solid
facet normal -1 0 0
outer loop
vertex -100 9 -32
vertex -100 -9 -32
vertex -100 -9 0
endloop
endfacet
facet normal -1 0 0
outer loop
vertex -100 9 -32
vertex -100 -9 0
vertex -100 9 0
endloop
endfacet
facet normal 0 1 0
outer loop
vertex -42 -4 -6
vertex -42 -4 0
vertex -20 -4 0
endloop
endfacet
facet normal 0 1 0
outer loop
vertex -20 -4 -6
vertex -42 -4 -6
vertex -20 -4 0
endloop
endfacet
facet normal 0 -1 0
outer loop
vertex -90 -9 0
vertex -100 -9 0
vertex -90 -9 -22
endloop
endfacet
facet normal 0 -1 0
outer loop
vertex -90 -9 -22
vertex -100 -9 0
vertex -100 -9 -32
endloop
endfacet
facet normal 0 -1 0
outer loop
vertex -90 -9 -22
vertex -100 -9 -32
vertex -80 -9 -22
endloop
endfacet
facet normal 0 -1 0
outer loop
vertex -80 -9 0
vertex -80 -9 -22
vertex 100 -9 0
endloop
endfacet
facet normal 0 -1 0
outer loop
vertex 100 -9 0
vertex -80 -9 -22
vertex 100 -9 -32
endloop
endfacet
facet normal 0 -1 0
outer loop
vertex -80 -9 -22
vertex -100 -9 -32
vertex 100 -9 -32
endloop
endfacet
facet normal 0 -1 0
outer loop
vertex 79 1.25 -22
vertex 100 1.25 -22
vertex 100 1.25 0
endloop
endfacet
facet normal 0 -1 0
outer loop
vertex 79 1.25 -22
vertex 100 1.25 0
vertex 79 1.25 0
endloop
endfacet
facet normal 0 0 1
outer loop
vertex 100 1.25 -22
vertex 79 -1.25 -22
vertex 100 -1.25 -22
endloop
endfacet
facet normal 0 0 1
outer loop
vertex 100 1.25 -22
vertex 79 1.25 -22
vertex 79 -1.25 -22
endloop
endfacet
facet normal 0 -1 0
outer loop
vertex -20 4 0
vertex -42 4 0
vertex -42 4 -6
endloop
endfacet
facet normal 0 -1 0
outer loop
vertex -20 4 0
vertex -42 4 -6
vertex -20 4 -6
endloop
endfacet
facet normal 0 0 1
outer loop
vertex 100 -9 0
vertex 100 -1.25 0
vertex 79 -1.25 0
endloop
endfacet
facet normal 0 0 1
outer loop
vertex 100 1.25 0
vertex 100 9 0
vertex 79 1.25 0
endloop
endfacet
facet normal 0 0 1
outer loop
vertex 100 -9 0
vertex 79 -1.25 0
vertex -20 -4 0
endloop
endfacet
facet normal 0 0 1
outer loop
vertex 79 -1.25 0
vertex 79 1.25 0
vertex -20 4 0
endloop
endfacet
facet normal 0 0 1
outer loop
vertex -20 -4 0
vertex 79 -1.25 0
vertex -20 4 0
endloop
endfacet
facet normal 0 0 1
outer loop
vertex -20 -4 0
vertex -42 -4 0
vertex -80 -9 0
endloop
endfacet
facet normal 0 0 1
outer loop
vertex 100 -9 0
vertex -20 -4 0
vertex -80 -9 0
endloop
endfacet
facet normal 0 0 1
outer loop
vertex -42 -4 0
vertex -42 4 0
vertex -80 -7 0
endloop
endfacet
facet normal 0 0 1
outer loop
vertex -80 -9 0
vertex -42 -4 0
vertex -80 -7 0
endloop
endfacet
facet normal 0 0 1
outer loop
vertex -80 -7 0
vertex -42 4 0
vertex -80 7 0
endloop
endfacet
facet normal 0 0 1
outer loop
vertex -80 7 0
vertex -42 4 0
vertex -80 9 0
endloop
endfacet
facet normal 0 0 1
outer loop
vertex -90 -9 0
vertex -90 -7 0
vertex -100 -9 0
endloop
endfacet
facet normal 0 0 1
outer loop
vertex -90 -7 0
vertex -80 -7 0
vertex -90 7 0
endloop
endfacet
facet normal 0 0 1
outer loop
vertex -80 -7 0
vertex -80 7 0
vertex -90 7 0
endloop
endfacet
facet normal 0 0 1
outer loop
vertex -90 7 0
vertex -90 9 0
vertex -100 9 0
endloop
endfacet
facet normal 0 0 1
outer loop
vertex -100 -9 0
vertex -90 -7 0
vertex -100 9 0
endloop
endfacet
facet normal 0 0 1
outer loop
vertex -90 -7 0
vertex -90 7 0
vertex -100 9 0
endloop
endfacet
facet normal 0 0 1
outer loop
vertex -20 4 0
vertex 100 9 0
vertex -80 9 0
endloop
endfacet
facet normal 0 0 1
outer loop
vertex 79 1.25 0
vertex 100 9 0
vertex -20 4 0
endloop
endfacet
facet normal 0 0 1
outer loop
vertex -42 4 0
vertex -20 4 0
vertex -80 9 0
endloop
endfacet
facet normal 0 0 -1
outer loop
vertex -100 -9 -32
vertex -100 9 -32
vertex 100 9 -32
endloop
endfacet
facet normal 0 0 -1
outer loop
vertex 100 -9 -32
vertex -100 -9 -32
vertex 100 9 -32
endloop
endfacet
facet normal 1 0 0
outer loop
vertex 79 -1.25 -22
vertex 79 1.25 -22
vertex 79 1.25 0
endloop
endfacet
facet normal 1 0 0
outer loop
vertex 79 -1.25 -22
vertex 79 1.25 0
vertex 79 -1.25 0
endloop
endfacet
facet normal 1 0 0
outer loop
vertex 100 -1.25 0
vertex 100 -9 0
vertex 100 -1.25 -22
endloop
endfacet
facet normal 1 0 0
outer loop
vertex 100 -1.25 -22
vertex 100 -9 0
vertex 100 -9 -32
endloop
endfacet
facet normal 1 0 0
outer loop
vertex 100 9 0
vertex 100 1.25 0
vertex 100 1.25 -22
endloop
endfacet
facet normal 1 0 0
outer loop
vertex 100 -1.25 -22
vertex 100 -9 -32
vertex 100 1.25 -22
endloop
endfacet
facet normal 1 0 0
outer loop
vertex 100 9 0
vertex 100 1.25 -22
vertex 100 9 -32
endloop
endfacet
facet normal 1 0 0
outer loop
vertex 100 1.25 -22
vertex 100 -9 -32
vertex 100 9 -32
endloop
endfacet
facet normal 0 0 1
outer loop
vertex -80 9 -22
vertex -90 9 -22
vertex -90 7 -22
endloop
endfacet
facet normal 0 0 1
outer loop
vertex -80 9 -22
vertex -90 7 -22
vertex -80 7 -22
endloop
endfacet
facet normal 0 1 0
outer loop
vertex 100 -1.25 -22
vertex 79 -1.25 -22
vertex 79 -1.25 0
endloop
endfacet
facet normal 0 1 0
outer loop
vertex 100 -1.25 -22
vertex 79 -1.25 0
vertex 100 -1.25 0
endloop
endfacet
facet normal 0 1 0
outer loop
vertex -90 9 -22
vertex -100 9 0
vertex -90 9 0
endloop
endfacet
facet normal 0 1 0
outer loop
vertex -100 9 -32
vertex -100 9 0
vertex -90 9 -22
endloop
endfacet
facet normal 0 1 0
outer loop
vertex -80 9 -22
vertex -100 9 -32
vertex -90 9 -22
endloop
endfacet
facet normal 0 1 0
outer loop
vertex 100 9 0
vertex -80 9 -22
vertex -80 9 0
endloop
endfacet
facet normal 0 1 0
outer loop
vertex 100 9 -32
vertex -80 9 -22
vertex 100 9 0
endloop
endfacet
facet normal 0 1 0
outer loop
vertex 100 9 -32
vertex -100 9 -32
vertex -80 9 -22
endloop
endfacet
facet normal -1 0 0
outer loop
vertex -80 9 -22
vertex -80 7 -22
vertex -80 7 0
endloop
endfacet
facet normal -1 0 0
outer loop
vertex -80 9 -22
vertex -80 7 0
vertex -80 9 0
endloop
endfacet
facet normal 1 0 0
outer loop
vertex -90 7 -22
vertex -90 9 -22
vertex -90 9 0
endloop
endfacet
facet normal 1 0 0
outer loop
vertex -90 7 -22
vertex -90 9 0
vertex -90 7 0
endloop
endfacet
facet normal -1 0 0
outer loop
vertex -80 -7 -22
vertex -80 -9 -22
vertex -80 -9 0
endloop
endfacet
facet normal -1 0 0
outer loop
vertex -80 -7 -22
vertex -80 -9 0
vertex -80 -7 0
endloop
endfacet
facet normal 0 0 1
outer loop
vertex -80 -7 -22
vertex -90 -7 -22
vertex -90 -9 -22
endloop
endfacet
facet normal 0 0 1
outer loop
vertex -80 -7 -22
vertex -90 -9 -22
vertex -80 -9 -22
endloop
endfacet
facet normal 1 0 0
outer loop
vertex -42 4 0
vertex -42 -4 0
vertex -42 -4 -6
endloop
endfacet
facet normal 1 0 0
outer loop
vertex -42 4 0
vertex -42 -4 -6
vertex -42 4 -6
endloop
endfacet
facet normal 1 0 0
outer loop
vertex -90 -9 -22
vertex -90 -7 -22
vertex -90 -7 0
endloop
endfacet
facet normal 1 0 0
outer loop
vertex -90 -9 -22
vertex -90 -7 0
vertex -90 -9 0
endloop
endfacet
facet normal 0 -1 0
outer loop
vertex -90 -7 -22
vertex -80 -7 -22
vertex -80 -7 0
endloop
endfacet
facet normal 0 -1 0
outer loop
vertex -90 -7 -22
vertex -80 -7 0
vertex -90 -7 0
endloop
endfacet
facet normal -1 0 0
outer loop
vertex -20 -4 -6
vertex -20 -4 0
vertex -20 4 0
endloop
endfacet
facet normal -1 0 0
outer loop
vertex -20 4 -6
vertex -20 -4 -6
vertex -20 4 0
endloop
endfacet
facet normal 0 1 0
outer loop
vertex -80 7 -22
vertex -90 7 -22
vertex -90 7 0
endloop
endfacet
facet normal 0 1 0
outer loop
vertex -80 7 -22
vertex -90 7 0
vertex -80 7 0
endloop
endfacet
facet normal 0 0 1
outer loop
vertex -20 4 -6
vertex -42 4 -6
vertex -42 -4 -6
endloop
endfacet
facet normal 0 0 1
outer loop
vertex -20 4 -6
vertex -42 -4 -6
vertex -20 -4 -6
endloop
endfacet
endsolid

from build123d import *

# Parameters (mm, degrees)
SKETCH002_W  = 200
SKETCH002_H  = 18
PAD001_DEPTH = 10
PAD_DEPTH    = 22
SKETCH001_W  = 22
SKETCH001_H  = 8
POCKET_DEPTH = 6


with BuildPart() as base:
    # Sketch002 → Pad001 (new body)
    with BuildSketch(Plane.XY):
        Rectangle(SKETCH002_W, SKETCH002_H)
    extrude(amount=PAD001_DEPTH)


with BuildPart() as base_1:
    # Body001 placement: moved
    add(base.part.moved(Location((0, 0, -32))))


with BuildPart() as model_fusion:
    # Sketch → Pad (new body)
    with BuildSketch(Plane.XY):
        Polygon((-100, 9), (-90, 9), (-90, 7), (-80, 7), (-80, 9), (100, 9), (100, 1.25), (79, 1.25), (79, -1.25), (100, -1.25), (100, -9), (-80, -9), (-80, -7), (-90, -7), (-90, -9), (-100, -9), align=None)
    extrude(amount=PAD_DEPTH)

    # Sketch001 (on Face18 of Pad) → Pocket (cut)
    with BuildSketch(Plane.XY.offset(22)):
        with Locations((-31, 0)):
            Rectangle(SKETCH001_W, SKETCH001_H)
    extrude(amount=-POCKET_DEPTH, mode=Mode.SUBTRACT)


with BuildPart() as model_fusion_1:
    # Body placement: moved
    add(model_fusion.part.moved(Location((0, 0, -22))))

    # Fusion: union Base
    add(base_1.part)


solid = model_fusion_1.part
